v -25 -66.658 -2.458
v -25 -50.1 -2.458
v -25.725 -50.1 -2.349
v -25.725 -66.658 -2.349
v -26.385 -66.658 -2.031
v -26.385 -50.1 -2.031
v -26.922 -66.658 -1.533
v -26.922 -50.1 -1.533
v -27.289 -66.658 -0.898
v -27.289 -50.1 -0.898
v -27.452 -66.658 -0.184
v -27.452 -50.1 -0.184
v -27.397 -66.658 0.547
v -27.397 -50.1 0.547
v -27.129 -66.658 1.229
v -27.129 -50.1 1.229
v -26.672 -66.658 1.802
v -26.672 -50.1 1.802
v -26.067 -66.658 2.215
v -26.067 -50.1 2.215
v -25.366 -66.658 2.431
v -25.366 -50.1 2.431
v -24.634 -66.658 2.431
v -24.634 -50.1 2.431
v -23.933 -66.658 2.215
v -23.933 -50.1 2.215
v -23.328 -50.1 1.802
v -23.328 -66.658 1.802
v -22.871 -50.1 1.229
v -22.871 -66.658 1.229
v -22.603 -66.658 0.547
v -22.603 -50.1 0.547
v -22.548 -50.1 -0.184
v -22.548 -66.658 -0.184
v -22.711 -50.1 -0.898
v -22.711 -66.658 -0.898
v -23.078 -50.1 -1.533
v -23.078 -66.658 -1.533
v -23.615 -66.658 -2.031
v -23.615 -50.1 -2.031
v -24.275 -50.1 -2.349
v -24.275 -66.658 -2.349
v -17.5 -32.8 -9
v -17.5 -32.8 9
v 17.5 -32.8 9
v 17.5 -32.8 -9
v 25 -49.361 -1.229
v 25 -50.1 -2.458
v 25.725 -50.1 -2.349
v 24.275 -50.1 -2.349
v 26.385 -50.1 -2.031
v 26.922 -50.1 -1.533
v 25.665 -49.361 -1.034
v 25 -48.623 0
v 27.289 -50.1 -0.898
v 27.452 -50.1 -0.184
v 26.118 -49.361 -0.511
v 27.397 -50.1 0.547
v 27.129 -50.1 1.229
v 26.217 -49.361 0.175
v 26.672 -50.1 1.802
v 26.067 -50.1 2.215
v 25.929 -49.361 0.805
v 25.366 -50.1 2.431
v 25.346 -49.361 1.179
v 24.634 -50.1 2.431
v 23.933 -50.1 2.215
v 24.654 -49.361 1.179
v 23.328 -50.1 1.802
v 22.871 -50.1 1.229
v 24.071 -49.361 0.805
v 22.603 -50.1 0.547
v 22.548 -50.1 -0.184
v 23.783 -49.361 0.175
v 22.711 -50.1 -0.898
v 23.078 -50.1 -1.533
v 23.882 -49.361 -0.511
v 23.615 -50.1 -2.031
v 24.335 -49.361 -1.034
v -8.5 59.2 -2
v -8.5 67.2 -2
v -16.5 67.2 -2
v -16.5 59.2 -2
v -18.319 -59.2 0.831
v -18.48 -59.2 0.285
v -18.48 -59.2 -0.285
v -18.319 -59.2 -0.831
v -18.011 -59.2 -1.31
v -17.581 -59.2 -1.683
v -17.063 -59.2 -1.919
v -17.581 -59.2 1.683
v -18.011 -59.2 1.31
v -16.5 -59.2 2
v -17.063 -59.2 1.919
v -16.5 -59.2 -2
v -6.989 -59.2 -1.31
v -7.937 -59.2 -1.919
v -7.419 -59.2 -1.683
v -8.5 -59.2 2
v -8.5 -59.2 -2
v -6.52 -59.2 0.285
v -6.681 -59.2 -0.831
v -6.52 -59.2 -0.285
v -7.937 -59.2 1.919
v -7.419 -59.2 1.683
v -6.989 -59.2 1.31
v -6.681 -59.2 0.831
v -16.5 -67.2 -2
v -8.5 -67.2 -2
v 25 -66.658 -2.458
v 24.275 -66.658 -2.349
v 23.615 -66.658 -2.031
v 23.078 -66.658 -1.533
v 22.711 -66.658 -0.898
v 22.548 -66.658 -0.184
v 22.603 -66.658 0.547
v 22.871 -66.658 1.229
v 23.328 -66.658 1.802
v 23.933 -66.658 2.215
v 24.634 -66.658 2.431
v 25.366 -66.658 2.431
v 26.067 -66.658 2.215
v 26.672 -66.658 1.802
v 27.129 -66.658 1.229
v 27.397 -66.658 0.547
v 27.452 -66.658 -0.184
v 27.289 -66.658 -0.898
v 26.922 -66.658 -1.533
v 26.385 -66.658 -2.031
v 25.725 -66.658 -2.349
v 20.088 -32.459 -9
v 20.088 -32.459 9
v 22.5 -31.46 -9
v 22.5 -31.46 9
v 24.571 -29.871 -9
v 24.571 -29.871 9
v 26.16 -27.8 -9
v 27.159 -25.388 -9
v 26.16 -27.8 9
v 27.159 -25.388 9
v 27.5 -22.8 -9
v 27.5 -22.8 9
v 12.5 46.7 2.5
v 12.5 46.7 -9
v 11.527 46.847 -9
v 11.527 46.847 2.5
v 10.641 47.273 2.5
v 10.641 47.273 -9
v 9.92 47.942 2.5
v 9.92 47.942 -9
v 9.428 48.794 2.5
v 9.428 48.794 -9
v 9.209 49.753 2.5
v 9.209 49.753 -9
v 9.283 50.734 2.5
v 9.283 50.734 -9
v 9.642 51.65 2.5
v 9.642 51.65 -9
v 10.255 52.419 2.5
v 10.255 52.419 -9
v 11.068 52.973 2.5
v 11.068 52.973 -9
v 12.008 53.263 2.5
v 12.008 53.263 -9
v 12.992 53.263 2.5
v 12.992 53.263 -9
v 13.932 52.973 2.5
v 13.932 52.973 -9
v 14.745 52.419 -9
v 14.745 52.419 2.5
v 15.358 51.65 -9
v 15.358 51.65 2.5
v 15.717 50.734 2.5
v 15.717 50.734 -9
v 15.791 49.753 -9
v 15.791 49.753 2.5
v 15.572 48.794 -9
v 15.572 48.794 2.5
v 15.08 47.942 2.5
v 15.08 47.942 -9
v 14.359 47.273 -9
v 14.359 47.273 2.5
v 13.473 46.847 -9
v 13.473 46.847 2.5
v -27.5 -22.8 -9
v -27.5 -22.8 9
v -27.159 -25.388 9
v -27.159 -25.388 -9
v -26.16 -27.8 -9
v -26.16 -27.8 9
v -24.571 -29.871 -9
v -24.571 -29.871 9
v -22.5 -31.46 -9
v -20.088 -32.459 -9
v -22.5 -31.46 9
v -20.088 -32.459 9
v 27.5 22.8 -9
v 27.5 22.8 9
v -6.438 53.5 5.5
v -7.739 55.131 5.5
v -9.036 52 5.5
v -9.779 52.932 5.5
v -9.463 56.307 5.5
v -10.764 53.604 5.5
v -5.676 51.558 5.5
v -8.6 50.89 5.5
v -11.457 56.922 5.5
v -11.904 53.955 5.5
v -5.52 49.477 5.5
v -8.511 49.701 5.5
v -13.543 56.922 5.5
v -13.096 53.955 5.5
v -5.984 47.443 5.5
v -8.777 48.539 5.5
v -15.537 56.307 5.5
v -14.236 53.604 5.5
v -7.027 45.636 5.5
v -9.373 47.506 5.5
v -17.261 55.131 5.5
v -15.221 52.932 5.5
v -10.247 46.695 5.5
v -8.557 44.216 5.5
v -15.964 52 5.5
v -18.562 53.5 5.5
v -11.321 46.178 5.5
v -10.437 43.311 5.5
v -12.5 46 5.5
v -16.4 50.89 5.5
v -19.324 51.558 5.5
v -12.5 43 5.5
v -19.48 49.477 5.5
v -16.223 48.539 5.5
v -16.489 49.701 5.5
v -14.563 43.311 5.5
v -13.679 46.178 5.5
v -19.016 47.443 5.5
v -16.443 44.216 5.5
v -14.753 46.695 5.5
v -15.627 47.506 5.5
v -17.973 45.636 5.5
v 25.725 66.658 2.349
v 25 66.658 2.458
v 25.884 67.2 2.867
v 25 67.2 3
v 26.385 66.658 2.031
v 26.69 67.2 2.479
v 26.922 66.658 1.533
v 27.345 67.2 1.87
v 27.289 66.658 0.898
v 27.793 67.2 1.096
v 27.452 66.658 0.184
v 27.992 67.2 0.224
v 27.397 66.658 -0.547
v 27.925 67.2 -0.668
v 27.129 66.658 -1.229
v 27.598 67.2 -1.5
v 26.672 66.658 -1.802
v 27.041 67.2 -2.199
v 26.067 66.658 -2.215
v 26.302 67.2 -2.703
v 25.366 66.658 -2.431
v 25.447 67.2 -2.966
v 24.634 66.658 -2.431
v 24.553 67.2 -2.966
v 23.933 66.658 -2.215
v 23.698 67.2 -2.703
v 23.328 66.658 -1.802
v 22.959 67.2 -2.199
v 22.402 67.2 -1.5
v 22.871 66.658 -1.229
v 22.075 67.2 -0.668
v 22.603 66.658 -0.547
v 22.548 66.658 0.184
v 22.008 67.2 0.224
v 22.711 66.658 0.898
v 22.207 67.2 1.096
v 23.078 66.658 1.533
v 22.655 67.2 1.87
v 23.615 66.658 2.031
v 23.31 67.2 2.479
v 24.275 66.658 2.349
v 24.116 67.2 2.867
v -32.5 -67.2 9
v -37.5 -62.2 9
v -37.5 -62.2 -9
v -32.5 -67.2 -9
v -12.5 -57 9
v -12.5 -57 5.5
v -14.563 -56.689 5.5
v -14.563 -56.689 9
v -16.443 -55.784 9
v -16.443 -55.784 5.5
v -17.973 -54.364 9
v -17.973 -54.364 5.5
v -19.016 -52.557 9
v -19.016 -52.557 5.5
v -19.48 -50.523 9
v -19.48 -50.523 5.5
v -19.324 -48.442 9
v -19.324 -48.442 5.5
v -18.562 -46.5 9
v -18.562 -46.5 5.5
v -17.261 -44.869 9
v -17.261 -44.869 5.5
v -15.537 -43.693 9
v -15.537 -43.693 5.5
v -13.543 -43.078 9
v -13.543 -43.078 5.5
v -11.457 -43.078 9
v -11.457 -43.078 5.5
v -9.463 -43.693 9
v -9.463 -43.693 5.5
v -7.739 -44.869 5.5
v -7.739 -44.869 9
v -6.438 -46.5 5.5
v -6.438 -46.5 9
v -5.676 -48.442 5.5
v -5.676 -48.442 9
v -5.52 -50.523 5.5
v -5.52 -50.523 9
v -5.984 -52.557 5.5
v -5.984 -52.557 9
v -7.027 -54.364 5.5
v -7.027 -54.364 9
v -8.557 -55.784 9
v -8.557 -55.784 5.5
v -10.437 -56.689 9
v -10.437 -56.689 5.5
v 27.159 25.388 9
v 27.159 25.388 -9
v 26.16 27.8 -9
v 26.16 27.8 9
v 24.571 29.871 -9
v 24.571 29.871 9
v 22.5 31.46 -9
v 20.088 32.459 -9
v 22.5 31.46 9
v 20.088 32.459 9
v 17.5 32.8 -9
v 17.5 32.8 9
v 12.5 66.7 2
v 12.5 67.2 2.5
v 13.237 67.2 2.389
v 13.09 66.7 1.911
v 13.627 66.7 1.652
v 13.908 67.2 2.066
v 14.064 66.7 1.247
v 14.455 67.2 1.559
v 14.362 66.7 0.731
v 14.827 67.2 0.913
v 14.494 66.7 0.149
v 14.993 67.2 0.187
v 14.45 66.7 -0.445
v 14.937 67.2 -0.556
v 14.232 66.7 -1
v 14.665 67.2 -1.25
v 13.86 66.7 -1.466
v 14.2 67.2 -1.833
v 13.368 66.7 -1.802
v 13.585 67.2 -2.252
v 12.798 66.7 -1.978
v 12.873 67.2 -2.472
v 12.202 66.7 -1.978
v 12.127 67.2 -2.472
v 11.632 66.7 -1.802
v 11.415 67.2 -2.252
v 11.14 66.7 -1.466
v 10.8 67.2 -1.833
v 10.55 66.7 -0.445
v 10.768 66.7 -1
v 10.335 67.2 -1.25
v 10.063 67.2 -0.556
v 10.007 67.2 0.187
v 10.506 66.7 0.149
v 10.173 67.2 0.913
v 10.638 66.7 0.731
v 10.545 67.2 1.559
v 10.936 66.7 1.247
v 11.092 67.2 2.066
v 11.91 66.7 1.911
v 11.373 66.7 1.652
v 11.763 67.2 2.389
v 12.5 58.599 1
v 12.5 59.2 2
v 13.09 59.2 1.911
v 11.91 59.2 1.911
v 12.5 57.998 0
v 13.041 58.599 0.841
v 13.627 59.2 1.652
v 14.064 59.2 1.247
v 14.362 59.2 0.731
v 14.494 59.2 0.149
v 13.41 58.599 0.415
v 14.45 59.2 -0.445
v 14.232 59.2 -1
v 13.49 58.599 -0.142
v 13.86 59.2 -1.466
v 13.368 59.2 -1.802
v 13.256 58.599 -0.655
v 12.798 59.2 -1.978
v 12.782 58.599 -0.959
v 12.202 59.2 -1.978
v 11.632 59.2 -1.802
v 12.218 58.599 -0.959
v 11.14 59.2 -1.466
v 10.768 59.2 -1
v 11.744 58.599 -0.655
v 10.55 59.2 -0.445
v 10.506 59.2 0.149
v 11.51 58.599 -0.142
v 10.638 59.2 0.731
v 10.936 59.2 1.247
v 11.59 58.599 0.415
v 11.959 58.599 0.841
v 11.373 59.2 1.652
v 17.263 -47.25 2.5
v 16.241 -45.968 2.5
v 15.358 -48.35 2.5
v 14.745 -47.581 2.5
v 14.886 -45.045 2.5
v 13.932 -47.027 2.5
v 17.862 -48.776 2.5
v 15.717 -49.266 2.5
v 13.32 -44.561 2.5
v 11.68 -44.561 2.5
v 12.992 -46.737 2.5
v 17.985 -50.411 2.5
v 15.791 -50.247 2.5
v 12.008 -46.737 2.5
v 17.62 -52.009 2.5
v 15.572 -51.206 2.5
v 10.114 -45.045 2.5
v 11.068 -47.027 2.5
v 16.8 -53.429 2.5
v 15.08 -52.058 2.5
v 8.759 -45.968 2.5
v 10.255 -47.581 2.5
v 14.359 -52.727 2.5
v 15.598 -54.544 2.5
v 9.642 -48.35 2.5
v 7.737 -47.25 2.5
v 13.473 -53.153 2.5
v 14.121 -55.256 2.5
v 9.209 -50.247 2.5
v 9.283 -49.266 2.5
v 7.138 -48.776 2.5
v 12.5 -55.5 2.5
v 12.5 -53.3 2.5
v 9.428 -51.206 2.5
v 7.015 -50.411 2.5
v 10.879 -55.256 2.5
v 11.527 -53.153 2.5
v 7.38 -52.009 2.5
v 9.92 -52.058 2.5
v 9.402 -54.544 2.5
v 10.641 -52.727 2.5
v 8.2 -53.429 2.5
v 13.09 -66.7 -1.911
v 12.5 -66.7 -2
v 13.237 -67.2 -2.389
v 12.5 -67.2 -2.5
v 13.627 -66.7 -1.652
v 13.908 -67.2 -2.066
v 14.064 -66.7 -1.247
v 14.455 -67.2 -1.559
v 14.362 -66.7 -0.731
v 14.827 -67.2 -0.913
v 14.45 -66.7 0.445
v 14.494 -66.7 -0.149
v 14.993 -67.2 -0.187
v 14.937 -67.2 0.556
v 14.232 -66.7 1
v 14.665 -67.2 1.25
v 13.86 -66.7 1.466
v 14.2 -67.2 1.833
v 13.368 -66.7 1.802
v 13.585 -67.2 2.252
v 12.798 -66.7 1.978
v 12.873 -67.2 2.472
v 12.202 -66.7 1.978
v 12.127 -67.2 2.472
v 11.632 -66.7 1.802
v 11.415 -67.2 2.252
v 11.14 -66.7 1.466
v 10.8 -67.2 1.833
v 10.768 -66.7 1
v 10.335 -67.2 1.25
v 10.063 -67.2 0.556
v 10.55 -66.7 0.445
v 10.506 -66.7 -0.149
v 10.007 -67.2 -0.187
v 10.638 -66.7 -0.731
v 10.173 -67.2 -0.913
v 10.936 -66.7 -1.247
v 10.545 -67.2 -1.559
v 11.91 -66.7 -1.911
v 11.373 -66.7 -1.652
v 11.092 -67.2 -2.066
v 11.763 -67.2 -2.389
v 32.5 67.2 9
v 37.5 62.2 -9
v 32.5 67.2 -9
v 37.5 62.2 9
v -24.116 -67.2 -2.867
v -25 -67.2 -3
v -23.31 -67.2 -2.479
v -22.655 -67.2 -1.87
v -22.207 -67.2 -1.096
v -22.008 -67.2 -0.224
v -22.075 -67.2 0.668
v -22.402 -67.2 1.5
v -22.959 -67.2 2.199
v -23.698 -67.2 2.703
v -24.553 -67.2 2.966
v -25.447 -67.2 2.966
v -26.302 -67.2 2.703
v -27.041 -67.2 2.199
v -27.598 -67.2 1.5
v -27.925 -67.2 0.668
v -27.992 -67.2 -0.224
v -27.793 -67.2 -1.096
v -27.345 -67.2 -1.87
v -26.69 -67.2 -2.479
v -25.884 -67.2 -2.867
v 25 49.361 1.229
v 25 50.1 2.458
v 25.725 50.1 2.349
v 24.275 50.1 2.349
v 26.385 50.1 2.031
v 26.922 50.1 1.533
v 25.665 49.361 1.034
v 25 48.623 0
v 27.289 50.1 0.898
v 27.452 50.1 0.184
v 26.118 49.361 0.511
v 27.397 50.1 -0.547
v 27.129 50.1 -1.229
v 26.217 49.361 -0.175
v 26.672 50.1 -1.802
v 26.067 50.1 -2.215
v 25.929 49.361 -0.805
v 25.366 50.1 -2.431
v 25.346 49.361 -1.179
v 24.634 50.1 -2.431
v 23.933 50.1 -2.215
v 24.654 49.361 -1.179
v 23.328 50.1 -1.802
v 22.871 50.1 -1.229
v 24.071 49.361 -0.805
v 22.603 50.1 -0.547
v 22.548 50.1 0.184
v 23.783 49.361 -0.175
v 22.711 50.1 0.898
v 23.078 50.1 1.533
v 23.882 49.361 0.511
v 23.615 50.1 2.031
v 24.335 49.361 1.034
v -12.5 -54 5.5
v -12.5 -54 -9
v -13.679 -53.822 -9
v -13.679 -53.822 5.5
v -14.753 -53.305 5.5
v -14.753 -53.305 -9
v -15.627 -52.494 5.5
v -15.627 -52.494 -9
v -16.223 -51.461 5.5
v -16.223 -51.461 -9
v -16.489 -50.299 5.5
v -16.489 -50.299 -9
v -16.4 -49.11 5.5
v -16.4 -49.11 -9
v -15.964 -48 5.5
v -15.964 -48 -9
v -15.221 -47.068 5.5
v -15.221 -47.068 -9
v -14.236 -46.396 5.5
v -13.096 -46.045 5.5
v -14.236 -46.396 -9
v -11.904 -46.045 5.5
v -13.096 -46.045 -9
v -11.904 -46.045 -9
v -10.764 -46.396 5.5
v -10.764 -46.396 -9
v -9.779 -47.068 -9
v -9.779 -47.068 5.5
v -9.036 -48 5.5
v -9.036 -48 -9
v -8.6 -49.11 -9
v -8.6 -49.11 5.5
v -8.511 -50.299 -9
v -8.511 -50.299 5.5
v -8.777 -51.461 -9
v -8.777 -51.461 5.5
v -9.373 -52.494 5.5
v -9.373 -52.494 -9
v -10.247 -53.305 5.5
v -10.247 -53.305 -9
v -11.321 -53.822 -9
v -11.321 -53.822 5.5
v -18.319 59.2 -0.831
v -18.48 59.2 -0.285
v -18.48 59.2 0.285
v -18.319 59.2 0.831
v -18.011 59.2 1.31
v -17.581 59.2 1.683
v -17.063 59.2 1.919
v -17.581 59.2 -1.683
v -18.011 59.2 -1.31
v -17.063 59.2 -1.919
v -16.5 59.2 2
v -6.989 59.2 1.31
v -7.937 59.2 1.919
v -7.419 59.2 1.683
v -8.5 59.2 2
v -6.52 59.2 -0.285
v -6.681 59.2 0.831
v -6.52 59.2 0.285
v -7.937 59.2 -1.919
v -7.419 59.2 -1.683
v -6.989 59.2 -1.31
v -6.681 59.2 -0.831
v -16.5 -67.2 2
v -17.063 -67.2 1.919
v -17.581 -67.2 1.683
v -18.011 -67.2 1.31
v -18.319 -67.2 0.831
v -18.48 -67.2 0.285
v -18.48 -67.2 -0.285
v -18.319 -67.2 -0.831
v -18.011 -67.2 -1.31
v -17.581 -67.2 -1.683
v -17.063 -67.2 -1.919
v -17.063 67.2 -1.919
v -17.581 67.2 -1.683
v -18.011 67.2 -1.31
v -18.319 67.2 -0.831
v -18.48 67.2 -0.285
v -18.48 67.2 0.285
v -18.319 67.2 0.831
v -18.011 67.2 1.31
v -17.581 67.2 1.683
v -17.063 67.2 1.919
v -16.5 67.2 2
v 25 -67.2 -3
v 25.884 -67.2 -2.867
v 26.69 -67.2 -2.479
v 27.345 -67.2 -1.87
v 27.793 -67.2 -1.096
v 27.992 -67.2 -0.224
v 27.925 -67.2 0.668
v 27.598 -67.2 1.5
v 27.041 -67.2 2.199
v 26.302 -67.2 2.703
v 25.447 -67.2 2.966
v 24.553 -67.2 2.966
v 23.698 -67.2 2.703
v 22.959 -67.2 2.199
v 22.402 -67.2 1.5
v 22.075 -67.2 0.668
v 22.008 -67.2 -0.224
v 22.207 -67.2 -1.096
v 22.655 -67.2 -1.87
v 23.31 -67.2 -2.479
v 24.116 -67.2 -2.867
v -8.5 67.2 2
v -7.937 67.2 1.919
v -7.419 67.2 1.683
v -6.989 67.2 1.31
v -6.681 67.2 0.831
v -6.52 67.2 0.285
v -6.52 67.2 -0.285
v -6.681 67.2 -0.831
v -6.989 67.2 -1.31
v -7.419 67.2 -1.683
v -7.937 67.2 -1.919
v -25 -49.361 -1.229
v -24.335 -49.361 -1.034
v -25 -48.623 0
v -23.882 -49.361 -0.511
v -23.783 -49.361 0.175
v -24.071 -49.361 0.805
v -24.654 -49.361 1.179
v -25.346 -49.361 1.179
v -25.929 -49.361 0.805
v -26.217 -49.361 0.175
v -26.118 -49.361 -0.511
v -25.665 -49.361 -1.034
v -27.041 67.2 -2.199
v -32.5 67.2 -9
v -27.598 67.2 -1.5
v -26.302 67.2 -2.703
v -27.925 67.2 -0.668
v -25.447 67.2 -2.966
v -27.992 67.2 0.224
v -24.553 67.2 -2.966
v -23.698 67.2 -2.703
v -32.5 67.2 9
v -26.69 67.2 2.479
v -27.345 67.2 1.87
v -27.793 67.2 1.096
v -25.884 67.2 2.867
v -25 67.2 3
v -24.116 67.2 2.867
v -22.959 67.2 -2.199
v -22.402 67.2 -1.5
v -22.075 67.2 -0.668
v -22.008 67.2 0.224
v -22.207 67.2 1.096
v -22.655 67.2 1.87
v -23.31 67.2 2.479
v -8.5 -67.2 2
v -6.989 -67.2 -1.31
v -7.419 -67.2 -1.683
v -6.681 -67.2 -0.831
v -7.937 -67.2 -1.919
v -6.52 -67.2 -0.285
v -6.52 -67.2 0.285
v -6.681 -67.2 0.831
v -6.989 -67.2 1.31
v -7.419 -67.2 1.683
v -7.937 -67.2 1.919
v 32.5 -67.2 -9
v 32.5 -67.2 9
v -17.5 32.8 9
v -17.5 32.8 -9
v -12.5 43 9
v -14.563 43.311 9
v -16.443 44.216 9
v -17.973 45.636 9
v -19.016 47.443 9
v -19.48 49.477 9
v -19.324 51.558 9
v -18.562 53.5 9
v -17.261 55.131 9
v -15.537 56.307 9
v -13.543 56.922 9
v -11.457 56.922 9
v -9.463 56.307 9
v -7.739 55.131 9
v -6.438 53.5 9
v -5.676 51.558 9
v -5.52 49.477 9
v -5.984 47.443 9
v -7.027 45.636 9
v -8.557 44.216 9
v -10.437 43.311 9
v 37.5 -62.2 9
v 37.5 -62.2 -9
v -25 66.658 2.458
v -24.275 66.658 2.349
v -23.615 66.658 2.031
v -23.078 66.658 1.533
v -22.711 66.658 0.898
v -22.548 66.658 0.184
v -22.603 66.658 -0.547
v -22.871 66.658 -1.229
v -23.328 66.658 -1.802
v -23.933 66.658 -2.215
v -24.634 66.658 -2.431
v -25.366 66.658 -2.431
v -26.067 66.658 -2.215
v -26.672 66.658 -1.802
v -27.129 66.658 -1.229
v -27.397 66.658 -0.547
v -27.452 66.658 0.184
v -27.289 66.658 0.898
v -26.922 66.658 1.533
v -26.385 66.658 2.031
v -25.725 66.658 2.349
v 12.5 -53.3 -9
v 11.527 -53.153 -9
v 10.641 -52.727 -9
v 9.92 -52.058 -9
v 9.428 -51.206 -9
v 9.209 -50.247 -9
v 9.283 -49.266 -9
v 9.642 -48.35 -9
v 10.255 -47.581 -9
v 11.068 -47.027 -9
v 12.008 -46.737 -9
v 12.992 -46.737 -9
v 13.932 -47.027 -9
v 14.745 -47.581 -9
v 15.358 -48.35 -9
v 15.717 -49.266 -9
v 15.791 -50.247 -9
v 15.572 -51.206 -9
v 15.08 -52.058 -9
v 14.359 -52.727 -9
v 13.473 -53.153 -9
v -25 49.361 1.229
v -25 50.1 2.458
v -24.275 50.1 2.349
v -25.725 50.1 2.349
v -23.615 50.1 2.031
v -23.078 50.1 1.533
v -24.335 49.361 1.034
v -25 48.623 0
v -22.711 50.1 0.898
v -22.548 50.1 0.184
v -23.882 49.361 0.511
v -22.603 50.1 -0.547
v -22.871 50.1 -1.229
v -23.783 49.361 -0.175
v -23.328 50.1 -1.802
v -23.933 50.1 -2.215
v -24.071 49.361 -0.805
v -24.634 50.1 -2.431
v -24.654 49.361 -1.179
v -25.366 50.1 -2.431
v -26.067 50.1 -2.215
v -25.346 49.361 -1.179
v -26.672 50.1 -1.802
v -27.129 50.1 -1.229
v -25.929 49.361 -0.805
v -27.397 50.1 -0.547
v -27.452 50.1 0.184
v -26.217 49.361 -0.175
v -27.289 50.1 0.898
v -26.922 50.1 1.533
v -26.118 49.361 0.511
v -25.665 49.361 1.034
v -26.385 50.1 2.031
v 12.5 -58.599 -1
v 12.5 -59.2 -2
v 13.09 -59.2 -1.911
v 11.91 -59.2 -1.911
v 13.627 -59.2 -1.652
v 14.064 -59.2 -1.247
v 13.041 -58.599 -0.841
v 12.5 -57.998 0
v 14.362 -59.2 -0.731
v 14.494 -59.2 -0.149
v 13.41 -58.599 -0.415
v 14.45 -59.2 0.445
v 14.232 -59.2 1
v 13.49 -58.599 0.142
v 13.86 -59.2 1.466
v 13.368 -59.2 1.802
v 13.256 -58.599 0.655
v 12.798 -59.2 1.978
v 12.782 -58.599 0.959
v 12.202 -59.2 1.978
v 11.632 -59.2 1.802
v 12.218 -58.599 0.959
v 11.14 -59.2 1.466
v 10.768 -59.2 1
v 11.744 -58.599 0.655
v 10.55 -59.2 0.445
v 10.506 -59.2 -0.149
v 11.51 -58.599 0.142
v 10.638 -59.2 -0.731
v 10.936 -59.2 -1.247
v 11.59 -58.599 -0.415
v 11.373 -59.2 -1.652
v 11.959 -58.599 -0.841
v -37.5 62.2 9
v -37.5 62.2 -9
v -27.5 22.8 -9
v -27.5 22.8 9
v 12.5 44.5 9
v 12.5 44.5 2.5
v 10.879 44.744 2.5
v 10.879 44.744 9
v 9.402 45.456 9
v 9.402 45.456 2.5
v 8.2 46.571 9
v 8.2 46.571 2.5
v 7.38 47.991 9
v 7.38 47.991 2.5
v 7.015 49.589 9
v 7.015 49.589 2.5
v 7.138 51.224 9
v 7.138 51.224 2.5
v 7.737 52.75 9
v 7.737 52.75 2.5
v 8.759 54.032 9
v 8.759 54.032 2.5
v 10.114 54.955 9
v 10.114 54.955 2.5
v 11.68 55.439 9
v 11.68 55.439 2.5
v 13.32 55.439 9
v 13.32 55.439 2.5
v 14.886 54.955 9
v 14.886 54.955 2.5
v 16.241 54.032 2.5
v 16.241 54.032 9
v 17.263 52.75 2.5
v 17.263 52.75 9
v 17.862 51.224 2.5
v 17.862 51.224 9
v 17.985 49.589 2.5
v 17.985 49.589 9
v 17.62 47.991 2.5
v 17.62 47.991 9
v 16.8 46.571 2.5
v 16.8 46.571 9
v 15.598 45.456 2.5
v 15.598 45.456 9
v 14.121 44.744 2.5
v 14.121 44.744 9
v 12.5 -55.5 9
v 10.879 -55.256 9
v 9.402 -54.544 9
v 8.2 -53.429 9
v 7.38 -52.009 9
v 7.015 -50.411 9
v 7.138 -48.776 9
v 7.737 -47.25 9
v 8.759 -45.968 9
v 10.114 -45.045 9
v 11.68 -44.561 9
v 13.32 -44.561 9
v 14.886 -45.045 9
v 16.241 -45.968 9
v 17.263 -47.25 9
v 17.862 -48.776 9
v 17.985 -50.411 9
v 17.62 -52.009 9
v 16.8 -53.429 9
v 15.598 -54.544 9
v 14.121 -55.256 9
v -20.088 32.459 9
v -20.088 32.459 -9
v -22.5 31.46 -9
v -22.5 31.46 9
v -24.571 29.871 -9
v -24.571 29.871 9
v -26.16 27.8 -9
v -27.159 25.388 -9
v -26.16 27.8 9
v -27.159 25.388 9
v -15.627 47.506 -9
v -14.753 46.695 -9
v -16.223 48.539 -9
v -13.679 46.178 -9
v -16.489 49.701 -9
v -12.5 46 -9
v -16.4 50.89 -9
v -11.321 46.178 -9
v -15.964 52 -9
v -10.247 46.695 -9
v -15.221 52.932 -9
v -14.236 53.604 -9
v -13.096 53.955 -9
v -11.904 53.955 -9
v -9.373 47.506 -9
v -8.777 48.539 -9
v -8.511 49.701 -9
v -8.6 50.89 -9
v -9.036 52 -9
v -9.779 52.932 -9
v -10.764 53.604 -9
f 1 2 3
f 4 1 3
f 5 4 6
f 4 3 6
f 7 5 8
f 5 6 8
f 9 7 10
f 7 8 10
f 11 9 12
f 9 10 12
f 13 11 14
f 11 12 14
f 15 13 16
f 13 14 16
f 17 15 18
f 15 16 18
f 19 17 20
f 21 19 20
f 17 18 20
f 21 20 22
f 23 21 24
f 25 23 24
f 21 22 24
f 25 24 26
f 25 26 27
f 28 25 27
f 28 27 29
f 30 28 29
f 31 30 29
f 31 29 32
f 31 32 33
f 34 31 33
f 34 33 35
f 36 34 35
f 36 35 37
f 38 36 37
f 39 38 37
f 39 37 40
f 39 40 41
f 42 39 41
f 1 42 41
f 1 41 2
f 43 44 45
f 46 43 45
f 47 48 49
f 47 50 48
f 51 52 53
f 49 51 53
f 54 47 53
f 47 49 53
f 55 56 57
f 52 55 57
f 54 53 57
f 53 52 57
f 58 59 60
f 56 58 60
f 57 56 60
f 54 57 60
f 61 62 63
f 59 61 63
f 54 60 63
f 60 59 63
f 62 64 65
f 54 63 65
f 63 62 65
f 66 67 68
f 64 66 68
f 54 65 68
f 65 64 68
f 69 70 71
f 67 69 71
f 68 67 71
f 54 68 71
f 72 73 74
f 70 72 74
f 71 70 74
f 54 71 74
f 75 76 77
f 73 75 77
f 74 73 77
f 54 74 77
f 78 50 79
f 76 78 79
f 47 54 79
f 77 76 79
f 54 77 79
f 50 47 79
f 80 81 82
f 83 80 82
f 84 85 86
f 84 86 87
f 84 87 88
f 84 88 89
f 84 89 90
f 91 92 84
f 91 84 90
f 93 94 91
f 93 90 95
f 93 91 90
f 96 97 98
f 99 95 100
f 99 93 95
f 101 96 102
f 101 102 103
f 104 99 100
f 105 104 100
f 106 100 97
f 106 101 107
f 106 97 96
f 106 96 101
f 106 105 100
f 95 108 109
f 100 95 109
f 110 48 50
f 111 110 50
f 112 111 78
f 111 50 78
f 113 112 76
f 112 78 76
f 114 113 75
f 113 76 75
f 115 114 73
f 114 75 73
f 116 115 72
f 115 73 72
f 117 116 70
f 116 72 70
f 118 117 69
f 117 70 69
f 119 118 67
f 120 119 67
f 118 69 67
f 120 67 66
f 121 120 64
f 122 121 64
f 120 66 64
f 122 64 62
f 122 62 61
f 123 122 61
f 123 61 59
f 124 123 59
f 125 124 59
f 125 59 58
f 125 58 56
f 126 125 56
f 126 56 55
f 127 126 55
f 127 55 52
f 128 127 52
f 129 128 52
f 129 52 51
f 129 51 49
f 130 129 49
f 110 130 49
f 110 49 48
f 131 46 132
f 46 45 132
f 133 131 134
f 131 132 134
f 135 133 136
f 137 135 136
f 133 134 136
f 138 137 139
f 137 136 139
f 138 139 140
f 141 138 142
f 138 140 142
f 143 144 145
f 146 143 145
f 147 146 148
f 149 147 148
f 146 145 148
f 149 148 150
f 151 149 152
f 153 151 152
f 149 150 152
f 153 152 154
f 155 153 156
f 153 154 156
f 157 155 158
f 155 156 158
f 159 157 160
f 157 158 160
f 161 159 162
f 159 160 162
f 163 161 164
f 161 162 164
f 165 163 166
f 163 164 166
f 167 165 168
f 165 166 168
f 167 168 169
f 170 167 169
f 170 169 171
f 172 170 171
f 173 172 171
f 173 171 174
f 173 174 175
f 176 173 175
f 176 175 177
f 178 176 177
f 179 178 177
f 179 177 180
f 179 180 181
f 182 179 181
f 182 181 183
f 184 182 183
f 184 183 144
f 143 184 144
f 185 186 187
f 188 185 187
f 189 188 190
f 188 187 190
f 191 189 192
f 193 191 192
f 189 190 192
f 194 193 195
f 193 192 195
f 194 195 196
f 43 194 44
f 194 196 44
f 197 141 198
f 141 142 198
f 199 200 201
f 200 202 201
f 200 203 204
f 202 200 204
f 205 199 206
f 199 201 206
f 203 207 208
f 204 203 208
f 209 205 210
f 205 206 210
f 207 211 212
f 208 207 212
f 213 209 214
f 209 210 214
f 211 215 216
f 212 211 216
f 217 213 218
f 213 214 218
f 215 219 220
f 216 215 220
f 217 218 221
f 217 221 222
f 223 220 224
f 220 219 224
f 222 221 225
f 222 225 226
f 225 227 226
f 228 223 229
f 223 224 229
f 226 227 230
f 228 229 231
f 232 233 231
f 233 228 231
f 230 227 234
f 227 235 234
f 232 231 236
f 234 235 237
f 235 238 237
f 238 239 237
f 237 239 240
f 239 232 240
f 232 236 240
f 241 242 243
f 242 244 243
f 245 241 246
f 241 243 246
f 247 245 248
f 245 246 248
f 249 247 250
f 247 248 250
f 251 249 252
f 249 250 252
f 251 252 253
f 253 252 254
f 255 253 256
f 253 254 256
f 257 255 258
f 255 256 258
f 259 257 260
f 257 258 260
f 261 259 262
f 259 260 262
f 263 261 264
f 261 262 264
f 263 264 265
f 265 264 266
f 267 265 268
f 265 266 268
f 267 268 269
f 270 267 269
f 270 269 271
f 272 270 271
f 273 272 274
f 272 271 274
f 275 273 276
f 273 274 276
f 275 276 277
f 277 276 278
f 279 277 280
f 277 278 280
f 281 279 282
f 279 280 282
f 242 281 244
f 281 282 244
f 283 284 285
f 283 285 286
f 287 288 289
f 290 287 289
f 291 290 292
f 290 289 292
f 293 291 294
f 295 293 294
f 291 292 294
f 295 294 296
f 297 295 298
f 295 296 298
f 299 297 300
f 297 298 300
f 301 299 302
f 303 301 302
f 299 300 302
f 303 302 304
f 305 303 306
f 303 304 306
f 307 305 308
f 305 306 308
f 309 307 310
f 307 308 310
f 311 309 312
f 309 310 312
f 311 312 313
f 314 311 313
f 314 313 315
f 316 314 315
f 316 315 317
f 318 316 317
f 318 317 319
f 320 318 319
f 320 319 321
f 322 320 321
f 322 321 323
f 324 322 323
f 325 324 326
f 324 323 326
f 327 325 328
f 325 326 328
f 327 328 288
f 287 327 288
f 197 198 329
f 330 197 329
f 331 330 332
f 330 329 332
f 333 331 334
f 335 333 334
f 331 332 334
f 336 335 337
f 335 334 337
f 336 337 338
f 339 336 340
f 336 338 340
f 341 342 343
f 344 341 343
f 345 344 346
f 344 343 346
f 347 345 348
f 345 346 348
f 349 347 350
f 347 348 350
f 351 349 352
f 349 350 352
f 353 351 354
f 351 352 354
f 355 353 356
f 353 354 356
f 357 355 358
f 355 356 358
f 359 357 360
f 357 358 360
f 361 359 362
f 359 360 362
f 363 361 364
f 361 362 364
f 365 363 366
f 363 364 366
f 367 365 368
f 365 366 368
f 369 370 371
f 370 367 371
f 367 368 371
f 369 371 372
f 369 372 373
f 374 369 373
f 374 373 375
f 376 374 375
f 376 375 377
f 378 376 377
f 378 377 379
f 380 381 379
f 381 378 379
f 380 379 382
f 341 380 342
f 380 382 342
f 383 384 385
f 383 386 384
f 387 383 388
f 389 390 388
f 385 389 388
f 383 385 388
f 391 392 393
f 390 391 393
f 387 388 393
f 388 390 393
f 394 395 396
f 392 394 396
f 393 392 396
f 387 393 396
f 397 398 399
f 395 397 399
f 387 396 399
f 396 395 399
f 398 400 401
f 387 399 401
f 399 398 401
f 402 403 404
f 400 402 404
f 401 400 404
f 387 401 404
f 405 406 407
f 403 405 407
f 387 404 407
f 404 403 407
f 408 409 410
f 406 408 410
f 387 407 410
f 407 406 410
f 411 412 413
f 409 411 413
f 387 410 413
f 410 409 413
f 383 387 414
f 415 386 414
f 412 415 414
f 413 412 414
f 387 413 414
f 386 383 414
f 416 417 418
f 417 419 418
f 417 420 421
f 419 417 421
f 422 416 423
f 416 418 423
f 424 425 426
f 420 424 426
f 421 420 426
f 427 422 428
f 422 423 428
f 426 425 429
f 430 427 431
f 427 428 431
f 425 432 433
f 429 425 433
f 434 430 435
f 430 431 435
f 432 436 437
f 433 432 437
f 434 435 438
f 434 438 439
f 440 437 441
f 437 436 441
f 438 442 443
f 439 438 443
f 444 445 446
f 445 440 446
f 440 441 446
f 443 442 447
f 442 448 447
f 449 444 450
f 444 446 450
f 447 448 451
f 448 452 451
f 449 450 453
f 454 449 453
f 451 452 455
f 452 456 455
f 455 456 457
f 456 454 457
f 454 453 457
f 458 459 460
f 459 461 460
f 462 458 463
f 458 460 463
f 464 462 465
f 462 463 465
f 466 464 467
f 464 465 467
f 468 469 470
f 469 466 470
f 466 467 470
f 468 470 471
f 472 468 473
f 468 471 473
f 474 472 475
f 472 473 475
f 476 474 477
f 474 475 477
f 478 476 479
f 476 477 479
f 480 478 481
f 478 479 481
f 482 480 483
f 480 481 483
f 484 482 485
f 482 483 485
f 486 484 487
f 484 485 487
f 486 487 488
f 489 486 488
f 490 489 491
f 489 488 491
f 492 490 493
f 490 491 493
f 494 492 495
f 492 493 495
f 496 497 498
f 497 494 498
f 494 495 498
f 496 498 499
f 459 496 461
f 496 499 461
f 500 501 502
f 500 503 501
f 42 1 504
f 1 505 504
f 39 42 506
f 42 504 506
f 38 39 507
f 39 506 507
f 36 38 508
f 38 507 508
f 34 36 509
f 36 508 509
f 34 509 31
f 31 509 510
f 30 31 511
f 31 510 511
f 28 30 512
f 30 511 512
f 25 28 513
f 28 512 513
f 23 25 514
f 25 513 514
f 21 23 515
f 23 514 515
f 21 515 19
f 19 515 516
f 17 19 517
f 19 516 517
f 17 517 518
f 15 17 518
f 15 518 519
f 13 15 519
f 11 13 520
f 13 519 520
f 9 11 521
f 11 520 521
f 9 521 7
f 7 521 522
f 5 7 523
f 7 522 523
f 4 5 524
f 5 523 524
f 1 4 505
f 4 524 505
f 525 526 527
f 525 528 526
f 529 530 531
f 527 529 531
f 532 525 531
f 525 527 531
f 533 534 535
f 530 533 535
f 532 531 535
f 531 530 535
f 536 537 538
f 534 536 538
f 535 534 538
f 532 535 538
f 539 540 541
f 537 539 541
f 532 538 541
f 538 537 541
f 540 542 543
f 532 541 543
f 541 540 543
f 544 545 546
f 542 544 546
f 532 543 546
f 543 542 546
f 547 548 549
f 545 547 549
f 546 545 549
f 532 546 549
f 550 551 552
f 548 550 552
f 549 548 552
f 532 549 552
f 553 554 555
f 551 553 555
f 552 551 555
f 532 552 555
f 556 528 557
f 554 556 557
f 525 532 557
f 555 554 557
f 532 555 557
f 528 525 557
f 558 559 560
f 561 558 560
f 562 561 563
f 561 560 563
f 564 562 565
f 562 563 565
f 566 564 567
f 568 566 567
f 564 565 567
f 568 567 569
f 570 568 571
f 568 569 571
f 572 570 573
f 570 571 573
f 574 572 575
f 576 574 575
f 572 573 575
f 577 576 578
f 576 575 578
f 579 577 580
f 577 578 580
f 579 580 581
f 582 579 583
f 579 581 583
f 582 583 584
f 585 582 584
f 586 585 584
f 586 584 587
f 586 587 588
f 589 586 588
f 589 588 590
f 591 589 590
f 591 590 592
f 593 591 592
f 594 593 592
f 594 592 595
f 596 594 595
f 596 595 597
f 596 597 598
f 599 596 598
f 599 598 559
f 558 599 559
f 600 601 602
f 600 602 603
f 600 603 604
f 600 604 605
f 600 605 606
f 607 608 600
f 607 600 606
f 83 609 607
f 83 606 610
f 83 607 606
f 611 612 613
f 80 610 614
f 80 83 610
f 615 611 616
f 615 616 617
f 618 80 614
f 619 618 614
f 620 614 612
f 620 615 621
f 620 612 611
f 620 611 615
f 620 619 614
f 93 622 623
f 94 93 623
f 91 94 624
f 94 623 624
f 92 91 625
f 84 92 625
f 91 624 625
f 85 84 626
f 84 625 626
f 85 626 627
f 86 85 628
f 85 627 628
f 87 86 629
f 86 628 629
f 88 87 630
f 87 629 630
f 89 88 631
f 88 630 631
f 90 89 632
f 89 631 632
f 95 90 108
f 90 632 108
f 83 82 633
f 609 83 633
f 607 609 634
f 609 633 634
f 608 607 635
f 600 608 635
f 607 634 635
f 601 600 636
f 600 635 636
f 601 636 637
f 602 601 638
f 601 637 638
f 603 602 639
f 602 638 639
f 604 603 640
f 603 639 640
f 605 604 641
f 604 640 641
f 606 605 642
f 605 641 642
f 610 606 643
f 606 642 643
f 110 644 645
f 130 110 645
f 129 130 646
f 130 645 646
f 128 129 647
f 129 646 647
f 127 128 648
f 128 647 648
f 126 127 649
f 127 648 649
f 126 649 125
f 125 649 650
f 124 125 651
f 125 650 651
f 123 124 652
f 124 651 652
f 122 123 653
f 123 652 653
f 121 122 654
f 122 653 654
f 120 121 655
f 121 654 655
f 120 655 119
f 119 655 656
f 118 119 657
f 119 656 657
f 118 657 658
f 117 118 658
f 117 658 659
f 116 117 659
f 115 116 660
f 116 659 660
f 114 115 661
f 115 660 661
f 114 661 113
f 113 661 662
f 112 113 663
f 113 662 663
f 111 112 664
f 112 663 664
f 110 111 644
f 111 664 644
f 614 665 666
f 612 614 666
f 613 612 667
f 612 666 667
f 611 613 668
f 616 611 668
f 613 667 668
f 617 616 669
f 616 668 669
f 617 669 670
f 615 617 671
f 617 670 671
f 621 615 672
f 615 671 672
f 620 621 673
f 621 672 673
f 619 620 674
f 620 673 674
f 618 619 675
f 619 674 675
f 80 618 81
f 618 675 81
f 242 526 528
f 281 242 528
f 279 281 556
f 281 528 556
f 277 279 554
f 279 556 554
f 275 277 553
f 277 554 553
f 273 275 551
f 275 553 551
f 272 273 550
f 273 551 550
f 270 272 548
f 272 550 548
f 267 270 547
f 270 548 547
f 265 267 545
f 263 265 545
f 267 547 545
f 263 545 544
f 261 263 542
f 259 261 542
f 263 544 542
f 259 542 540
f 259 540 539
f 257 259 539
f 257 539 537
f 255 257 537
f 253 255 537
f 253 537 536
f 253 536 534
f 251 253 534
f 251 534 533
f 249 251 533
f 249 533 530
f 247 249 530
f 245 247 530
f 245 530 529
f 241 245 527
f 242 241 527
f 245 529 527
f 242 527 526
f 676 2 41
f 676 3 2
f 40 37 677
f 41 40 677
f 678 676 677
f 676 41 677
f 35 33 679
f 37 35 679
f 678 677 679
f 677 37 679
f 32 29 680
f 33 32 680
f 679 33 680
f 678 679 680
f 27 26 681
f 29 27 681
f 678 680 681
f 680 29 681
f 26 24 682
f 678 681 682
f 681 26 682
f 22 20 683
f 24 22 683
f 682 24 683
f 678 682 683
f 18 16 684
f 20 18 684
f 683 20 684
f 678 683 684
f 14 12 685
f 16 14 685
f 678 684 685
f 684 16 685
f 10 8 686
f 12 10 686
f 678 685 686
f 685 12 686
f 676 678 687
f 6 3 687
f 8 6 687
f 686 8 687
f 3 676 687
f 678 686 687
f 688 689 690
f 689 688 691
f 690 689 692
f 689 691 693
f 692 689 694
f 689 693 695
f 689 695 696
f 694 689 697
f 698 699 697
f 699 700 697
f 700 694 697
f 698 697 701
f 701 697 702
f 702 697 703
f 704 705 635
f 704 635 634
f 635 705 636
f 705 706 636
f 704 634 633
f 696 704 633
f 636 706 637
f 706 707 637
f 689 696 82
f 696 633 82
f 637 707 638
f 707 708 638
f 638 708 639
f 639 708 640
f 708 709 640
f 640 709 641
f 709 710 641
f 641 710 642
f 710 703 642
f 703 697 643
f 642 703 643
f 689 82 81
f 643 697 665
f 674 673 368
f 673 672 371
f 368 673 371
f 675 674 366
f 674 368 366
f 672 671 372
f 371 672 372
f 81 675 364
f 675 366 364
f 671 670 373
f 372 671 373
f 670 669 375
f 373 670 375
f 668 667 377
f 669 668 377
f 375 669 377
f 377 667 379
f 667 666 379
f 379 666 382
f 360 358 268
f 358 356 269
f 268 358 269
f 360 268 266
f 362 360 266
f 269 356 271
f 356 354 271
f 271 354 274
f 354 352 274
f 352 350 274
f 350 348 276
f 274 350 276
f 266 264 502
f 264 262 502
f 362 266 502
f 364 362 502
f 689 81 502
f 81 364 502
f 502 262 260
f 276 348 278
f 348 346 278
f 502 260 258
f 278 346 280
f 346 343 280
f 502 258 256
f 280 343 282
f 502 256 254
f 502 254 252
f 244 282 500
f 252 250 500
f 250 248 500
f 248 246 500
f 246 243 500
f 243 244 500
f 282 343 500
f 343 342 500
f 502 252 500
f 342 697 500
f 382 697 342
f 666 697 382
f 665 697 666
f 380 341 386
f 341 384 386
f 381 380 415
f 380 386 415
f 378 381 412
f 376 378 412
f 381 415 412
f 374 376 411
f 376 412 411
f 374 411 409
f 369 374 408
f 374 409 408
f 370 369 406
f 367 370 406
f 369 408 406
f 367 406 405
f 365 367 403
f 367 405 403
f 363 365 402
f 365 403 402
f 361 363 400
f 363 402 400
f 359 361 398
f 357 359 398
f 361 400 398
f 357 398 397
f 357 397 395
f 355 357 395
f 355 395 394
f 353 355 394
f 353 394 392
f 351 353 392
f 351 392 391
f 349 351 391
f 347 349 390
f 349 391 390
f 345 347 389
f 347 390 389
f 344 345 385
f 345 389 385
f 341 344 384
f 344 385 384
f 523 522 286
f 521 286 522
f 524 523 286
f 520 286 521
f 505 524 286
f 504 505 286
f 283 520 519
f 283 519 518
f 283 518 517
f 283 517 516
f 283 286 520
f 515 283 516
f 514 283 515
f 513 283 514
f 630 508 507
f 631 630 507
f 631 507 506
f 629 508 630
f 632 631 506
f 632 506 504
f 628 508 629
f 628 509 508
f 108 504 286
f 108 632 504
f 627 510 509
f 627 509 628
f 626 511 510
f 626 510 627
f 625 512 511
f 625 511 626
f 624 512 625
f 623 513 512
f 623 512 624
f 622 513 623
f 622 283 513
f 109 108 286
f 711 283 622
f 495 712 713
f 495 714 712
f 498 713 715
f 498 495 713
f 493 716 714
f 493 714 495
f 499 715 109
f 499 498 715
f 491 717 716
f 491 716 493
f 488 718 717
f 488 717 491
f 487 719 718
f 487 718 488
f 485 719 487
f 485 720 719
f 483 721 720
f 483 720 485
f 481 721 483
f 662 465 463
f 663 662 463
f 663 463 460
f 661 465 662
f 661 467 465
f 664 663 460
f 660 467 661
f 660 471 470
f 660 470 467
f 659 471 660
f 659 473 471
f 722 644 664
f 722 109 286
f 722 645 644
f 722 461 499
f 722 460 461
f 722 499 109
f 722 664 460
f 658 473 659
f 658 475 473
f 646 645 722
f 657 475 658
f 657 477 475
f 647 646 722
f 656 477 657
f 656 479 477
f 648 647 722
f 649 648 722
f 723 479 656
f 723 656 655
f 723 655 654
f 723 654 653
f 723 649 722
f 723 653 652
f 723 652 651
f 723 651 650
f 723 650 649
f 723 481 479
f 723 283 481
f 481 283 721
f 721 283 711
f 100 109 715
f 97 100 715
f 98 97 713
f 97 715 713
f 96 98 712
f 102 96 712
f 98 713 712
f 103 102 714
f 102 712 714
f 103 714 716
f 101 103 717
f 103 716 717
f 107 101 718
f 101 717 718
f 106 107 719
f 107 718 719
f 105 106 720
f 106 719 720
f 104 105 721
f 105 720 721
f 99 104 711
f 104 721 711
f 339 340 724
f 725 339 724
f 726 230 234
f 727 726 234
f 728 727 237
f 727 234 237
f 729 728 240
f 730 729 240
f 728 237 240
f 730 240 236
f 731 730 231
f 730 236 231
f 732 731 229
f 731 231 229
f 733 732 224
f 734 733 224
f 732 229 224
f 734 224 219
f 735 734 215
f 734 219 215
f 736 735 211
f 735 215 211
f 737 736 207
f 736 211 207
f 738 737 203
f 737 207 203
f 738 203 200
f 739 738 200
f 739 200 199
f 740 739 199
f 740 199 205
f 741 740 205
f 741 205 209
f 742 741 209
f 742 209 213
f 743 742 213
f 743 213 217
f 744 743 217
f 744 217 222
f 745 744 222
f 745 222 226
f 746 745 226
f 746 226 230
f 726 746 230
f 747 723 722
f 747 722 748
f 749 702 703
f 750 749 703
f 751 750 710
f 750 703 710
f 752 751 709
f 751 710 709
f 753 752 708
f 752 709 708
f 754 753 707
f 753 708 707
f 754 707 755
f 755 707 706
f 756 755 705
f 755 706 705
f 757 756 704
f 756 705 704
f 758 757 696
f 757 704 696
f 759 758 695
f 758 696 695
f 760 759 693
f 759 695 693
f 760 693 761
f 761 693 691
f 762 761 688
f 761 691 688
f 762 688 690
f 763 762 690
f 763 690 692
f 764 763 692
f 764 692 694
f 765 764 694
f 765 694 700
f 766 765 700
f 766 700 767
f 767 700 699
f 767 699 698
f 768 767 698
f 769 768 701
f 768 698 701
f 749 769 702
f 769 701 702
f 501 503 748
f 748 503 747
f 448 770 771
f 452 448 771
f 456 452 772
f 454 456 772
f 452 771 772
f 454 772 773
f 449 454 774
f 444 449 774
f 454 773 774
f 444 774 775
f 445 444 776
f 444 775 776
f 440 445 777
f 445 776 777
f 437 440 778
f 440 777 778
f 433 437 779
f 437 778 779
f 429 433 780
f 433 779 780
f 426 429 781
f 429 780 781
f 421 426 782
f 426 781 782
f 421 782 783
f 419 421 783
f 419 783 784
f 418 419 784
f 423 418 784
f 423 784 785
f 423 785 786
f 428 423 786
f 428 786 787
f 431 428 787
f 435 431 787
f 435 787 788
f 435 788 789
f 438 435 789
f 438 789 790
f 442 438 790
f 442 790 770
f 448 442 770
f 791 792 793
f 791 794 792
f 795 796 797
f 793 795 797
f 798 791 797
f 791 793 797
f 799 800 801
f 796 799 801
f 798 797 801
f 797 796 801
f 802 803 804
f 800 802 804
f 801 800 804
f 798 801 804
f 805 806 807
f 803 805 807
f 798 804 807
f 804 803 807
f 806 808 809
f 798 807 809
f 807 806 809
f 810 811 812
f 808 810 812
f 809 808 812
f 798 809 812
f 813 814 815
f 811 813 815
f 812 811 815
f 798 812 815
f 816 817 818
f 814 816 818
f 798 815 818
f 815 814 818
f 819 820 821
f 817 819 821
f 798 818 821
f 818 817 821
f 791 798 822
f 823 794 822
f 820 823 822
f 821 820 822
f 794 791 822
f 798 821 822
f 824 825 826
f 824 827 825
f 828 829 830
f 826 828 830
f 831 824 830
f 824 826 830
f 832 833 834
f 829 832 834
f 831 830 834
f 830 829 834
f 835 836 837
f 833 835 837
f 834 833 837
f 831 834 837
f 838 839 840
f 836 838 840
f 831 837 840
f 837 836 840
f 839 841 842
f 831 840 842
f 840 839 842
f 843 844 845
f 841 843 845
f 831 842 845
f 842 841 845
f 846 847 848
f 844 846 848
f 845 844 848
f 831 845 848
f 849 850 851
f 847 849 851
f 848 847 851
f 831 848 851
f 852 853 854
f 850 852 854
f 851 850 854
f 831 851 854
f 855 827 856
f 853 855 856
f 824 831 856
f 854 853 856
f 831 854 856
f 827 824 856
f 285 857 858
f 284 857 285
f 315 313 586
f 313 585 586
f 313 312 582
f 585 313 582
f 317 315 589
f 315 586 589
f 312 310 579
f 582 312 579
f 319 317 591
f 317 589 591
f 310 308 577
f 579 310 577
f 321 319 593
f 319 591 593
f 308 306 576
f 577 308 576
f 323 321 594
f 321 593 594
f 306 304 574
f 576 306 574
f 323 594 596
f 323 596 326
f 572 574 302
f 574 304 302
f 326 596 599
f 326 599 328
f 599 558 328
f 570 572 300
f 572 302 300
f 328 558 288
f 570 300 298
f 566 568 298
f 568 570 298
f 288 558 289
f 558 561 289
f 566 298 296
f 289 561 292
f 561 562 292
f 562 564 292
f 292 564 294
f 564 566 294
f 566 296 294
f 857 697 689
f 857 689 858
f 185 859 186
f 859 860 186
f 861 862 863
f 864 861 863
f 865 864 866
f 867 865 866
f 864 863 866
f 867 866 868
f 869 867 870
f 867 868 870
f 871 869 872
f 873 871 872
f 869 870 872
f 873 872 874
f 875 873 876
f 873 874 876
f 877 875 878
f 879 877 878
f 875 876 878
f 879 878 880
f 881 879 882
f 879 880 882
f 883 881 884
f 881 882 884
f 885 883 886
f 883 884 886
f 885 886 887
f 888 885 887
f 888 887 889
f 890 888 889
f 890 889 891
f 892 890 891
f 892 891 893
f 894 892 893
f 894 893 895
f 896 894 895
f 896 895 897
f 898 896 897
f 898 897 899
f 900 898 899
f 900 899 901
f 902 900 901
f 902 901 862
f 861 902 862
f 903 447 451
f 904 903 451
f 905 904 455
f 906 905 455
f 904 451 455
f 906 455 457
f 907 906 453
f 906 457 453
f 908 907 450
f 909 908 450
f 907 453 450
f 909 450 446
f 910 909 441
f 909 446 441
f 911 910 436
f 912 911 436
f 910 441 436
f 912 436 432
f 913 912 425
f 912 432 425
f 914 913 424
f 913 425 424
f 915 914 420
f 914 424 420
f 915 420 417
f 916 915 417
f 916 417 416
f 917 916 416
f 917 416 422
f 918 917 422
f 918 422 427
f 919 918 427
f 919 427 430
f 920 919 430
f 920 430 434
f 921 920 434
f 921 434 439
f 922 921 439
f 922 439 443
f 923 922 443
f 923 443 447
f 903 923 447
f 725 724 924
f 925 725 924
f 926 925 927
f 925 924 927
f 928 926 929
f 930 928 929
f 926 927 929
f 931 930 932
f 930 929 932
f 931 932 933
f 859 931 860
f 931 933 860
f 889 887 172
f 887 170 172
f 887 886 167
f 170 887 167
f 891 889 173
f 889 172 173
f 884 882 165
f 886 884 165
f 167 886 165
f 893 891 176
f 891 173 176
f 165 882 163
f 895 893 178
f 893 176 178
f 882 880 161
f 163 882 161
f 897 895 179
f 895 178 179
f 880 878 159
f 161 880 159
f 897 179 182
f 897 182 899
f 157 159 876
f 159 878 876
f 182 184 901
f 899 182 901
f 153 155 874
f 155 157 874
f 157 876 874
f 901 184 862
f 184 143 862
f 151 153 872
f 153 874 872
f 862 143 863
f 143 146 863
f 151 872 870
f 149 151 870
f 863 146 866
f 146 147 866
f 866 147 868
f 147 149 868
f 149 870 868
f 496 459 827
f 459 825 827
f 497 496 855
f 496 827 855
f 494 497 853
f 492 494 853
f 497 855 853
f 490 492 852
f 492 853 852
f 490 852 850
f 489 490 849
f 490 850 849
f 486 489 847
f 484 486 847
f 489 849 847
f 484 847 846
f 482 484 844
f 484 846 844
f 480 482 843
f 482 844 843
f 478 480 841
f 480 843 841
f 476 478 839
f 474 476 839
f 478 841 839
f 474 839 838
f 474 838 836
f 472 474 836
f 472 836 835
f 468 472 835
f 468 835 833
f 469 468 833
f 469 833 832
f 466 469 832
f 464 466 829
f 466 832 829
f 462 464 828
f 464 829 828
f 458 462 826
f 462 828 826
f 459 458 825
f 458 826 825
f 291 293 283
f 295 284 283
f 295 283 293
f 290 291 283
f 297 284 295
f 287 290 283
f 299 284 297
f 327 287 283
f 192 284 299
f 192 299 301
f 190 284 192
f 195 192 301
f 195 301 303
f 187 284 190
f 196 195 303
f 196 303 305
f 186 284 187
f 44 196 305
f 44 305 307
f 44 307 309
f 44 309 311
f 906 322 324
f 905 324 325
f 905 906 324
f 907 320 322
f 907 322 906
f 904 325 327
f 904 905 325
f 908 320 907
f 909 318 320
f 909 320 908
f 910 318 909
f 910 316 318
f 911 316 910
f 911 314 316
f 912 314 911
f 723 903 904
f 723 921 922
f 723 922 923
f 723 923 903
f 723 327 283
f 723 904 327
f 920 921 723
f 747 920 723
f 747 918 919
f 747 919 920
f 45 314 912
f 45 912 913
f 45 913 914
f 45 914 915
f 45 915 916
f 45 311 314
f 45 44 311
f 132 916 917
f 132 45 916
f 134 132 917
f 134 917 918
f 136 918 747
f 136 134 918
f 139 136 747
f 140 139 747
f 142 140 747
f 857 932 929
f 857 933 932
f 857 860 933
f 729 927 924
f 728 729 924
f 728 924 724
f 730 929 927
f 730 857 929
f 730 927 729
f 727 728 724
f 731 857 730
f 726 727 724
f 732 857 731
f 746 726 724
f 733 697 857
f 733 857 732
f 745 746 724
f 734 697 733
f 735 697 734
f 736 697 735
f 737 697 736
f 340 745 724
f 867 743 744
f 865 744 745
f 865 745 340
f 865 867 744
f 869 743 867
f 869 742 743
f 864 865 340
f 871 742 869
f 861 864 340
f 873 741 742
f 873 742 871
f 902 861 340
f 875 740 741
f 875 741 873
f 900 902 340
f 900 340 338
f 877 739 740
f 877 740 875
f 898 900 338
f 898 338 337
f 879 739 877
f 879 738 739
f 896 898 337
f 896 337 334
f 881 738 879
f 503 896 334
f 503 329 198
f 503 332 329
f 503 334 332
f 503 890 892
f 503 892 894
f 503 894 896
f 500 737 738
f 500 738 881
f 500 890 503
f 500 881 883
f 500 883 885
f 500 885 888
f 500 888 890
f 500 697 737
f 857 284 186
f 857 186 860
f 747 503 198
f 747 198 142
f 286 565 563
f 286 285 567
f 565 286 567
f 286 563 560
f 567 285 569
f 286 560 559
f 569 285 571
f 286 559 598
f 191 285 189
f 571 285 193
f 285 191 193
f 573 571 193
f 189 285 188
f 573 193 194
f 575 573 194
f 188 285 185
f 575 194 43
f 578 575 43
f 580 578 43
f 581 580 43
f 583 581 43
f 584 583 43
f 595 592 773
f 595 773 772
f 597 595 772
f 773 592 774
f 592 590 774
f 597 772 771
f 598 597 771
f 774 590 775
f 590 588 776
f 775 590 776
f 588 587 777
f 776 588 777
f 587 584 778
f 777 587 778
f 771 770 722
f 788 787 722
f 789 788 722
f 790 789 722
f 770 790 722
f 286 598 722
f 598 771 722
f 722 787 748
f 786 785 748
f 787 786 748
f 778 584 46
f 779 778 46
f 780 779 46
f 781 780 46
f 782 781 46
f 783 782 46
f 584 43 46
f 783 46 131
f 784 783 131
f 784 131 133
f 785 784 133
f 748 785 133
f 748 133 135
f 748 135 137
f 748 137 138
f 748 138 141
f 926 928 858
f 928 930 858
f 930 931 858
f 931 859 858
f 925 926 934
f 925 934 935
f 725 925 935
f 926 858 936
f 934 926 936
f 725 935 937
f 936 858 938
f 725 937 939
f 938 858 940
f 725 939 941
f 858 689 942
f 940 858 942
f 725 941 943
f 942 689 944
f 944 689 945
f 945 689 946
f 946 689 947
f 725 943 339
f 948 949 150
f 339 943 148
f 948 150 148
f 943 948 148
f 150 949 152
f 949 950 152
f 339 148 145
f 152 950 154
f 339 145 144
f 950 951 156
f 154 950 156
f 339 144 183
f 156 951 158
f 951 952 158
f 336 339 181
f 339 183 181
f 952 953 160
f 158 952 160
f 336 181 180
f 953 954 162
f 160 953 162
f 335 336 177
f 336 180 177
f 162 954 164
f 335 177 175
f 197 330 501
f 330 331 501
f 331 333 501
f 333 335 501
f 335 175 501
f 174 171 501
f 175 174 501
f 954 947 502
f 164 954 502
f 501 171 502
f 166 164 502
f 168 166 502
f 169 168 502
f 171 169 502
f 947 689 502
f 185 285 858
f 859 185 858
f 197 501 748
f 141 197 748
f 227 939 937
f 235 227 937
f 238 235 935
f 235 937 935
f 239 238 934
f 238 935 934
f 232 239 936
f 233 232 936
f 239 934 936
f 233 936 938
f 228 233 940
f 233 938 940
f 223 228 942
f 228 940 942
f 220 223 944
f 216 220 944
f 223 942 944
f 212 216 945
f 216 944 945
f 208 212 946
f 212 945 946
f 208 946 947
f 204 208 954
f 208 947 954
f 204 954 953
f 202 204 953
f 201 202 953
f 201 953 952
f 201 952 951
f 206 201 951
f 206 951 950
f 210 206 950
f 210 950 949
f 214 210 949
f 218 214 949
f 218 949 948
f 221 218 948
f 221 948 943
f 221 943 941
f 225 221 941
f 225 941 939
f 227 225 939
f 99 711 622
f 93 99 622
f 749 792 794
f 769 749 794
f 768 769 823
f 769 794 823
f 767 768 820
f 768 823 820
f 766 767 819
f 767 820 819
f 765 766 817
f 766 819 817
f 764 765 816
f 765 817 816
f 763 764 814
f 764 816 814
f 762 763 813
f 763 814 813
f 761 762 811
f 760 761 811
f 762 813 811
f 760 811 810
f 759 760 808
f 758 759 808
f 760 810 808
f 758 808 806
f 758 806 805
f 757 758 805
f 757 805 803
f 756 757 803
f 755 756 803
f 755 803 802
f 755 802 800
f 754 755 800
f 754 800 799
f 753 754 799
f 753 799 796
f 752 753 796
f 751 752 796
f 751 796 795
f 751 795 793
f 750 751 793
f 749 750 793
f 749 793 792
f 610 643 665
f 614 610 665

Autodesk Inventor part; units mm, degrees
ref_plane "YZ Plane" through (0, 0, 0) normal (1, 0, 0) x (0, 1, 0)
ref_plane "XZ Plane" through (0, 0, 0) normal (0, 1, 0) x (-1, 0, 0)
ref_plane "XY Plane" through (0, 0, 0) normal (0, 0, 1) x (1, 0, 0)
sketch "3H7Slot" plane through (0, 0, 0) normal (0, 0, 1) x (1, 0, 0)
  line L0 (32.4992, 25.6932) -> (32.4992, 24.1932) construction
  line L1 (30.9992, 25.6932) -> (30.9992, 24.1932)
  line L2 (33.9992, 24.1932) -> (33.9992, 25.6932)
  arc A0 (33.9992, 25.6932) -> (30.9992, 25.6932) centre (32.4992, 25.6932) ccw
  arc A1 (30.9992, 24.1932) -> (33.9992, 24.1932) centre (32.4992, 24.1932) ccw
  point P0 (32.4992, 24.6932)
  dimension "d61" = 3
  dimension "d71" = 1.5
sketch "Sketch1" plane through (32.5, -67.2, -9) normal (0, 0, -1) x (-1, 0, 0)
  point P0 (32.5, 67.2)
sketch "Sketch2" plane through (-32.5, -67.2, 9) normal (0, 0, 1) x (1, 0, 0)
  line L0 (-5, 129.4) -> (-5, 5) projected
  line L1 (-5, 5) -> (0, 0) projected
  line L2 (0, 0) -> (65, 0) projected
  line L3 (65, 0) -> (70, 5) projected
  line L4 (70, 129.4) -> (70, 5) projected
  line L5 (70, 129.4) -> (65, 134.4) projected
  line L6 (0, 134.4) -> (65, 134.4) projected
  line L7 (0, 134.4) -> (-5, 129.4) projected
  line L8 (15, 34.4) -> (50, 34.4) projected
  arc A0 (5, 44.4) -> (15, 34.4) centre (15, 44.4) ccw projected
  line L9 (5, 90) -> (5, 44.4) projected
  arc A1 (15, 100) -> (5, 90) centre (15, 90) ccw projected
  line L10 (50, 100) -> (15, 100) projected
  arc A2 (60, 90) -> (50, 100) centre (50, 90) ccw projected
  line L11 (60, 44.4) -> (60, 90) projected
  arc A3 (50, 34.4) -> (60, 44.4) centre (50, 44.4) ccw projected
  circle A4 centre (20, 17.2) radius 5.5 projected
  circle A5 centre (45, 17.2) radius 5.5 projected
  circle A6 centre (45, 117.2) radius 5.5 projected
  circle A7 centre (20, 117.2) radius 5.5 projected
  circle A8 centre (32.497, 129.748) radius 2 projected
  arc A9 (34.497, 121.251) -> (30.497, 121.251) centre (32.497, 121.251) ccw projected
  line L12 (30.497, 113.251) -> (30.497, 121.251) projected
  arc A10 (30.497, 113.251) -> (34.497, 113.251) centre (32.497, 113.251) ccw projected
  line L13 (34.497, 121.251) -> (34.497, 113.251) projected
  point P0 (32.5, 67.2)
sketch "Sketch3" plane through (-32.5, 67.2, -9) normal (0, 1, 0) x (1, 0, 0)
  line L0 (65, 0) -> (0, 0) projected
  line L1 (0, 0) -> (0, -18) projected
  line L2 (0, -18) -> (65, -18) projected
  line L3 (65, -18) -> (65, 0) projected
  circle A0 centre (7.5, -9) radius 3.5 projected
  circle A1 centre (57.5, -9) radius 3.5 projected
  arc A2 (24, -11) -> (24, -7) centre (24, -9) ccw projected
  line L4 (16, -11) -> (24, -11) projected
  arc A3 (16, -7) -> (16, -11) centre (16, -9) ccw projected
  line L5 (24, -7) -> (16, -7) projected
  circle A4 centre (45, -9) radius 2 projected
  point P0 (32.5, -9)
sketch "Sketch4" plane through (-32.5, -67.2, 9) normal (0, -1, 0) x (1, 0, 0)
  line L0 (0, 0) -> (65, 0) projected
  line L1 (0, 0) -> (0, -18) projected
  line L2 (65, -18) -> (0, -18) projected
  line L3 (65, -18) -> (65, 0) projected
  circle A0 centre (45, -9) radius 2 projected
  line L4 (16, -11) -> (24, -11) projected
  arc A1 (16, -7) -> (16, -11) centre (16, -9) ccw projected
  line L5 (24, -7) -> (16, -7) projected
  arc A2 (24, -11) -> (24, -7) centre (24, -9) ccw projected
  circle A3 centre (57.5, -9) radius 3.5 projected
  circle A4 centre (7.5, -9) radius 3.5 projected
  point P0 (32.5, -9)
extrude "Extrusion1" add sketch "Sketch2" against normal up to surface (18 mm away) from surface at 0 contours L7 L6 L5 L4 L3 L2 L1 L0 | A4 | A5 | A6 | A7 | A8 | L13 A10 L12 A9
hole "M6Clearance" at (12.5, -50, 9) at (12.5, 50, 9) direction (0, 0, -1) diameter 6.6 end through all counterbore diameter 11 counterbore depth 6.5 clearance for "Socket Head Cap Screw ISO 4762" size "M6" standard "ISO"
hole "M6TapsTop" at (25, 67.2, 0) at (-25, 67.2, 0) direction (0, -1, 0) diameter 4.917 depth 17.1 tip angle 118 countersink diameter 6 countersink angle 90 thread size "M6x1" class "6H" standard "ISO Metric profile"
hole "M6TapsBottom" at (25, -67.2, 0) at (-25, -67.2, 0) direction (0, 1, 0) diameter 4.917 depth 17.1 tip angle 118 countersink diameter 6 countersink angle 90 thread size "M6x1" class "6H" standard "ISO Metric profile"
extrude "4H7AlignmentSlot1" cut sketch "Sketch3" against normal blind 8 contours L4 A3 L5 A2
extrude "4H7AlignmentSlot2" cut sketch "Sketch4" against normal blind 8 contours A1 L5 A2 L4
hole "4H7AlignmentHole1" at (12.5, -67.2, 0) direction (0, 1, 0) diameter 4 depth 8 tip angle 118 countersink diameter 5 countersink angle 90
hole "4H7AlignmentHole2" at (12.5, 67.2, 0) direction (0, -1, 0) diameter 4 depth 8 tip angle 118 countersink diameter 5 countersink angle 90
hole "ShoulderScrewHoles" at (-12.5, 50, 9) at (-12.5, -50, 9) direction (0, 0, -1) diameter 8 end through all counterbore diameter 14 counterbore depth 3.5
properties part number "FAB-P0003" material "SolidWorks Materials|6061-T6 (SS)"
